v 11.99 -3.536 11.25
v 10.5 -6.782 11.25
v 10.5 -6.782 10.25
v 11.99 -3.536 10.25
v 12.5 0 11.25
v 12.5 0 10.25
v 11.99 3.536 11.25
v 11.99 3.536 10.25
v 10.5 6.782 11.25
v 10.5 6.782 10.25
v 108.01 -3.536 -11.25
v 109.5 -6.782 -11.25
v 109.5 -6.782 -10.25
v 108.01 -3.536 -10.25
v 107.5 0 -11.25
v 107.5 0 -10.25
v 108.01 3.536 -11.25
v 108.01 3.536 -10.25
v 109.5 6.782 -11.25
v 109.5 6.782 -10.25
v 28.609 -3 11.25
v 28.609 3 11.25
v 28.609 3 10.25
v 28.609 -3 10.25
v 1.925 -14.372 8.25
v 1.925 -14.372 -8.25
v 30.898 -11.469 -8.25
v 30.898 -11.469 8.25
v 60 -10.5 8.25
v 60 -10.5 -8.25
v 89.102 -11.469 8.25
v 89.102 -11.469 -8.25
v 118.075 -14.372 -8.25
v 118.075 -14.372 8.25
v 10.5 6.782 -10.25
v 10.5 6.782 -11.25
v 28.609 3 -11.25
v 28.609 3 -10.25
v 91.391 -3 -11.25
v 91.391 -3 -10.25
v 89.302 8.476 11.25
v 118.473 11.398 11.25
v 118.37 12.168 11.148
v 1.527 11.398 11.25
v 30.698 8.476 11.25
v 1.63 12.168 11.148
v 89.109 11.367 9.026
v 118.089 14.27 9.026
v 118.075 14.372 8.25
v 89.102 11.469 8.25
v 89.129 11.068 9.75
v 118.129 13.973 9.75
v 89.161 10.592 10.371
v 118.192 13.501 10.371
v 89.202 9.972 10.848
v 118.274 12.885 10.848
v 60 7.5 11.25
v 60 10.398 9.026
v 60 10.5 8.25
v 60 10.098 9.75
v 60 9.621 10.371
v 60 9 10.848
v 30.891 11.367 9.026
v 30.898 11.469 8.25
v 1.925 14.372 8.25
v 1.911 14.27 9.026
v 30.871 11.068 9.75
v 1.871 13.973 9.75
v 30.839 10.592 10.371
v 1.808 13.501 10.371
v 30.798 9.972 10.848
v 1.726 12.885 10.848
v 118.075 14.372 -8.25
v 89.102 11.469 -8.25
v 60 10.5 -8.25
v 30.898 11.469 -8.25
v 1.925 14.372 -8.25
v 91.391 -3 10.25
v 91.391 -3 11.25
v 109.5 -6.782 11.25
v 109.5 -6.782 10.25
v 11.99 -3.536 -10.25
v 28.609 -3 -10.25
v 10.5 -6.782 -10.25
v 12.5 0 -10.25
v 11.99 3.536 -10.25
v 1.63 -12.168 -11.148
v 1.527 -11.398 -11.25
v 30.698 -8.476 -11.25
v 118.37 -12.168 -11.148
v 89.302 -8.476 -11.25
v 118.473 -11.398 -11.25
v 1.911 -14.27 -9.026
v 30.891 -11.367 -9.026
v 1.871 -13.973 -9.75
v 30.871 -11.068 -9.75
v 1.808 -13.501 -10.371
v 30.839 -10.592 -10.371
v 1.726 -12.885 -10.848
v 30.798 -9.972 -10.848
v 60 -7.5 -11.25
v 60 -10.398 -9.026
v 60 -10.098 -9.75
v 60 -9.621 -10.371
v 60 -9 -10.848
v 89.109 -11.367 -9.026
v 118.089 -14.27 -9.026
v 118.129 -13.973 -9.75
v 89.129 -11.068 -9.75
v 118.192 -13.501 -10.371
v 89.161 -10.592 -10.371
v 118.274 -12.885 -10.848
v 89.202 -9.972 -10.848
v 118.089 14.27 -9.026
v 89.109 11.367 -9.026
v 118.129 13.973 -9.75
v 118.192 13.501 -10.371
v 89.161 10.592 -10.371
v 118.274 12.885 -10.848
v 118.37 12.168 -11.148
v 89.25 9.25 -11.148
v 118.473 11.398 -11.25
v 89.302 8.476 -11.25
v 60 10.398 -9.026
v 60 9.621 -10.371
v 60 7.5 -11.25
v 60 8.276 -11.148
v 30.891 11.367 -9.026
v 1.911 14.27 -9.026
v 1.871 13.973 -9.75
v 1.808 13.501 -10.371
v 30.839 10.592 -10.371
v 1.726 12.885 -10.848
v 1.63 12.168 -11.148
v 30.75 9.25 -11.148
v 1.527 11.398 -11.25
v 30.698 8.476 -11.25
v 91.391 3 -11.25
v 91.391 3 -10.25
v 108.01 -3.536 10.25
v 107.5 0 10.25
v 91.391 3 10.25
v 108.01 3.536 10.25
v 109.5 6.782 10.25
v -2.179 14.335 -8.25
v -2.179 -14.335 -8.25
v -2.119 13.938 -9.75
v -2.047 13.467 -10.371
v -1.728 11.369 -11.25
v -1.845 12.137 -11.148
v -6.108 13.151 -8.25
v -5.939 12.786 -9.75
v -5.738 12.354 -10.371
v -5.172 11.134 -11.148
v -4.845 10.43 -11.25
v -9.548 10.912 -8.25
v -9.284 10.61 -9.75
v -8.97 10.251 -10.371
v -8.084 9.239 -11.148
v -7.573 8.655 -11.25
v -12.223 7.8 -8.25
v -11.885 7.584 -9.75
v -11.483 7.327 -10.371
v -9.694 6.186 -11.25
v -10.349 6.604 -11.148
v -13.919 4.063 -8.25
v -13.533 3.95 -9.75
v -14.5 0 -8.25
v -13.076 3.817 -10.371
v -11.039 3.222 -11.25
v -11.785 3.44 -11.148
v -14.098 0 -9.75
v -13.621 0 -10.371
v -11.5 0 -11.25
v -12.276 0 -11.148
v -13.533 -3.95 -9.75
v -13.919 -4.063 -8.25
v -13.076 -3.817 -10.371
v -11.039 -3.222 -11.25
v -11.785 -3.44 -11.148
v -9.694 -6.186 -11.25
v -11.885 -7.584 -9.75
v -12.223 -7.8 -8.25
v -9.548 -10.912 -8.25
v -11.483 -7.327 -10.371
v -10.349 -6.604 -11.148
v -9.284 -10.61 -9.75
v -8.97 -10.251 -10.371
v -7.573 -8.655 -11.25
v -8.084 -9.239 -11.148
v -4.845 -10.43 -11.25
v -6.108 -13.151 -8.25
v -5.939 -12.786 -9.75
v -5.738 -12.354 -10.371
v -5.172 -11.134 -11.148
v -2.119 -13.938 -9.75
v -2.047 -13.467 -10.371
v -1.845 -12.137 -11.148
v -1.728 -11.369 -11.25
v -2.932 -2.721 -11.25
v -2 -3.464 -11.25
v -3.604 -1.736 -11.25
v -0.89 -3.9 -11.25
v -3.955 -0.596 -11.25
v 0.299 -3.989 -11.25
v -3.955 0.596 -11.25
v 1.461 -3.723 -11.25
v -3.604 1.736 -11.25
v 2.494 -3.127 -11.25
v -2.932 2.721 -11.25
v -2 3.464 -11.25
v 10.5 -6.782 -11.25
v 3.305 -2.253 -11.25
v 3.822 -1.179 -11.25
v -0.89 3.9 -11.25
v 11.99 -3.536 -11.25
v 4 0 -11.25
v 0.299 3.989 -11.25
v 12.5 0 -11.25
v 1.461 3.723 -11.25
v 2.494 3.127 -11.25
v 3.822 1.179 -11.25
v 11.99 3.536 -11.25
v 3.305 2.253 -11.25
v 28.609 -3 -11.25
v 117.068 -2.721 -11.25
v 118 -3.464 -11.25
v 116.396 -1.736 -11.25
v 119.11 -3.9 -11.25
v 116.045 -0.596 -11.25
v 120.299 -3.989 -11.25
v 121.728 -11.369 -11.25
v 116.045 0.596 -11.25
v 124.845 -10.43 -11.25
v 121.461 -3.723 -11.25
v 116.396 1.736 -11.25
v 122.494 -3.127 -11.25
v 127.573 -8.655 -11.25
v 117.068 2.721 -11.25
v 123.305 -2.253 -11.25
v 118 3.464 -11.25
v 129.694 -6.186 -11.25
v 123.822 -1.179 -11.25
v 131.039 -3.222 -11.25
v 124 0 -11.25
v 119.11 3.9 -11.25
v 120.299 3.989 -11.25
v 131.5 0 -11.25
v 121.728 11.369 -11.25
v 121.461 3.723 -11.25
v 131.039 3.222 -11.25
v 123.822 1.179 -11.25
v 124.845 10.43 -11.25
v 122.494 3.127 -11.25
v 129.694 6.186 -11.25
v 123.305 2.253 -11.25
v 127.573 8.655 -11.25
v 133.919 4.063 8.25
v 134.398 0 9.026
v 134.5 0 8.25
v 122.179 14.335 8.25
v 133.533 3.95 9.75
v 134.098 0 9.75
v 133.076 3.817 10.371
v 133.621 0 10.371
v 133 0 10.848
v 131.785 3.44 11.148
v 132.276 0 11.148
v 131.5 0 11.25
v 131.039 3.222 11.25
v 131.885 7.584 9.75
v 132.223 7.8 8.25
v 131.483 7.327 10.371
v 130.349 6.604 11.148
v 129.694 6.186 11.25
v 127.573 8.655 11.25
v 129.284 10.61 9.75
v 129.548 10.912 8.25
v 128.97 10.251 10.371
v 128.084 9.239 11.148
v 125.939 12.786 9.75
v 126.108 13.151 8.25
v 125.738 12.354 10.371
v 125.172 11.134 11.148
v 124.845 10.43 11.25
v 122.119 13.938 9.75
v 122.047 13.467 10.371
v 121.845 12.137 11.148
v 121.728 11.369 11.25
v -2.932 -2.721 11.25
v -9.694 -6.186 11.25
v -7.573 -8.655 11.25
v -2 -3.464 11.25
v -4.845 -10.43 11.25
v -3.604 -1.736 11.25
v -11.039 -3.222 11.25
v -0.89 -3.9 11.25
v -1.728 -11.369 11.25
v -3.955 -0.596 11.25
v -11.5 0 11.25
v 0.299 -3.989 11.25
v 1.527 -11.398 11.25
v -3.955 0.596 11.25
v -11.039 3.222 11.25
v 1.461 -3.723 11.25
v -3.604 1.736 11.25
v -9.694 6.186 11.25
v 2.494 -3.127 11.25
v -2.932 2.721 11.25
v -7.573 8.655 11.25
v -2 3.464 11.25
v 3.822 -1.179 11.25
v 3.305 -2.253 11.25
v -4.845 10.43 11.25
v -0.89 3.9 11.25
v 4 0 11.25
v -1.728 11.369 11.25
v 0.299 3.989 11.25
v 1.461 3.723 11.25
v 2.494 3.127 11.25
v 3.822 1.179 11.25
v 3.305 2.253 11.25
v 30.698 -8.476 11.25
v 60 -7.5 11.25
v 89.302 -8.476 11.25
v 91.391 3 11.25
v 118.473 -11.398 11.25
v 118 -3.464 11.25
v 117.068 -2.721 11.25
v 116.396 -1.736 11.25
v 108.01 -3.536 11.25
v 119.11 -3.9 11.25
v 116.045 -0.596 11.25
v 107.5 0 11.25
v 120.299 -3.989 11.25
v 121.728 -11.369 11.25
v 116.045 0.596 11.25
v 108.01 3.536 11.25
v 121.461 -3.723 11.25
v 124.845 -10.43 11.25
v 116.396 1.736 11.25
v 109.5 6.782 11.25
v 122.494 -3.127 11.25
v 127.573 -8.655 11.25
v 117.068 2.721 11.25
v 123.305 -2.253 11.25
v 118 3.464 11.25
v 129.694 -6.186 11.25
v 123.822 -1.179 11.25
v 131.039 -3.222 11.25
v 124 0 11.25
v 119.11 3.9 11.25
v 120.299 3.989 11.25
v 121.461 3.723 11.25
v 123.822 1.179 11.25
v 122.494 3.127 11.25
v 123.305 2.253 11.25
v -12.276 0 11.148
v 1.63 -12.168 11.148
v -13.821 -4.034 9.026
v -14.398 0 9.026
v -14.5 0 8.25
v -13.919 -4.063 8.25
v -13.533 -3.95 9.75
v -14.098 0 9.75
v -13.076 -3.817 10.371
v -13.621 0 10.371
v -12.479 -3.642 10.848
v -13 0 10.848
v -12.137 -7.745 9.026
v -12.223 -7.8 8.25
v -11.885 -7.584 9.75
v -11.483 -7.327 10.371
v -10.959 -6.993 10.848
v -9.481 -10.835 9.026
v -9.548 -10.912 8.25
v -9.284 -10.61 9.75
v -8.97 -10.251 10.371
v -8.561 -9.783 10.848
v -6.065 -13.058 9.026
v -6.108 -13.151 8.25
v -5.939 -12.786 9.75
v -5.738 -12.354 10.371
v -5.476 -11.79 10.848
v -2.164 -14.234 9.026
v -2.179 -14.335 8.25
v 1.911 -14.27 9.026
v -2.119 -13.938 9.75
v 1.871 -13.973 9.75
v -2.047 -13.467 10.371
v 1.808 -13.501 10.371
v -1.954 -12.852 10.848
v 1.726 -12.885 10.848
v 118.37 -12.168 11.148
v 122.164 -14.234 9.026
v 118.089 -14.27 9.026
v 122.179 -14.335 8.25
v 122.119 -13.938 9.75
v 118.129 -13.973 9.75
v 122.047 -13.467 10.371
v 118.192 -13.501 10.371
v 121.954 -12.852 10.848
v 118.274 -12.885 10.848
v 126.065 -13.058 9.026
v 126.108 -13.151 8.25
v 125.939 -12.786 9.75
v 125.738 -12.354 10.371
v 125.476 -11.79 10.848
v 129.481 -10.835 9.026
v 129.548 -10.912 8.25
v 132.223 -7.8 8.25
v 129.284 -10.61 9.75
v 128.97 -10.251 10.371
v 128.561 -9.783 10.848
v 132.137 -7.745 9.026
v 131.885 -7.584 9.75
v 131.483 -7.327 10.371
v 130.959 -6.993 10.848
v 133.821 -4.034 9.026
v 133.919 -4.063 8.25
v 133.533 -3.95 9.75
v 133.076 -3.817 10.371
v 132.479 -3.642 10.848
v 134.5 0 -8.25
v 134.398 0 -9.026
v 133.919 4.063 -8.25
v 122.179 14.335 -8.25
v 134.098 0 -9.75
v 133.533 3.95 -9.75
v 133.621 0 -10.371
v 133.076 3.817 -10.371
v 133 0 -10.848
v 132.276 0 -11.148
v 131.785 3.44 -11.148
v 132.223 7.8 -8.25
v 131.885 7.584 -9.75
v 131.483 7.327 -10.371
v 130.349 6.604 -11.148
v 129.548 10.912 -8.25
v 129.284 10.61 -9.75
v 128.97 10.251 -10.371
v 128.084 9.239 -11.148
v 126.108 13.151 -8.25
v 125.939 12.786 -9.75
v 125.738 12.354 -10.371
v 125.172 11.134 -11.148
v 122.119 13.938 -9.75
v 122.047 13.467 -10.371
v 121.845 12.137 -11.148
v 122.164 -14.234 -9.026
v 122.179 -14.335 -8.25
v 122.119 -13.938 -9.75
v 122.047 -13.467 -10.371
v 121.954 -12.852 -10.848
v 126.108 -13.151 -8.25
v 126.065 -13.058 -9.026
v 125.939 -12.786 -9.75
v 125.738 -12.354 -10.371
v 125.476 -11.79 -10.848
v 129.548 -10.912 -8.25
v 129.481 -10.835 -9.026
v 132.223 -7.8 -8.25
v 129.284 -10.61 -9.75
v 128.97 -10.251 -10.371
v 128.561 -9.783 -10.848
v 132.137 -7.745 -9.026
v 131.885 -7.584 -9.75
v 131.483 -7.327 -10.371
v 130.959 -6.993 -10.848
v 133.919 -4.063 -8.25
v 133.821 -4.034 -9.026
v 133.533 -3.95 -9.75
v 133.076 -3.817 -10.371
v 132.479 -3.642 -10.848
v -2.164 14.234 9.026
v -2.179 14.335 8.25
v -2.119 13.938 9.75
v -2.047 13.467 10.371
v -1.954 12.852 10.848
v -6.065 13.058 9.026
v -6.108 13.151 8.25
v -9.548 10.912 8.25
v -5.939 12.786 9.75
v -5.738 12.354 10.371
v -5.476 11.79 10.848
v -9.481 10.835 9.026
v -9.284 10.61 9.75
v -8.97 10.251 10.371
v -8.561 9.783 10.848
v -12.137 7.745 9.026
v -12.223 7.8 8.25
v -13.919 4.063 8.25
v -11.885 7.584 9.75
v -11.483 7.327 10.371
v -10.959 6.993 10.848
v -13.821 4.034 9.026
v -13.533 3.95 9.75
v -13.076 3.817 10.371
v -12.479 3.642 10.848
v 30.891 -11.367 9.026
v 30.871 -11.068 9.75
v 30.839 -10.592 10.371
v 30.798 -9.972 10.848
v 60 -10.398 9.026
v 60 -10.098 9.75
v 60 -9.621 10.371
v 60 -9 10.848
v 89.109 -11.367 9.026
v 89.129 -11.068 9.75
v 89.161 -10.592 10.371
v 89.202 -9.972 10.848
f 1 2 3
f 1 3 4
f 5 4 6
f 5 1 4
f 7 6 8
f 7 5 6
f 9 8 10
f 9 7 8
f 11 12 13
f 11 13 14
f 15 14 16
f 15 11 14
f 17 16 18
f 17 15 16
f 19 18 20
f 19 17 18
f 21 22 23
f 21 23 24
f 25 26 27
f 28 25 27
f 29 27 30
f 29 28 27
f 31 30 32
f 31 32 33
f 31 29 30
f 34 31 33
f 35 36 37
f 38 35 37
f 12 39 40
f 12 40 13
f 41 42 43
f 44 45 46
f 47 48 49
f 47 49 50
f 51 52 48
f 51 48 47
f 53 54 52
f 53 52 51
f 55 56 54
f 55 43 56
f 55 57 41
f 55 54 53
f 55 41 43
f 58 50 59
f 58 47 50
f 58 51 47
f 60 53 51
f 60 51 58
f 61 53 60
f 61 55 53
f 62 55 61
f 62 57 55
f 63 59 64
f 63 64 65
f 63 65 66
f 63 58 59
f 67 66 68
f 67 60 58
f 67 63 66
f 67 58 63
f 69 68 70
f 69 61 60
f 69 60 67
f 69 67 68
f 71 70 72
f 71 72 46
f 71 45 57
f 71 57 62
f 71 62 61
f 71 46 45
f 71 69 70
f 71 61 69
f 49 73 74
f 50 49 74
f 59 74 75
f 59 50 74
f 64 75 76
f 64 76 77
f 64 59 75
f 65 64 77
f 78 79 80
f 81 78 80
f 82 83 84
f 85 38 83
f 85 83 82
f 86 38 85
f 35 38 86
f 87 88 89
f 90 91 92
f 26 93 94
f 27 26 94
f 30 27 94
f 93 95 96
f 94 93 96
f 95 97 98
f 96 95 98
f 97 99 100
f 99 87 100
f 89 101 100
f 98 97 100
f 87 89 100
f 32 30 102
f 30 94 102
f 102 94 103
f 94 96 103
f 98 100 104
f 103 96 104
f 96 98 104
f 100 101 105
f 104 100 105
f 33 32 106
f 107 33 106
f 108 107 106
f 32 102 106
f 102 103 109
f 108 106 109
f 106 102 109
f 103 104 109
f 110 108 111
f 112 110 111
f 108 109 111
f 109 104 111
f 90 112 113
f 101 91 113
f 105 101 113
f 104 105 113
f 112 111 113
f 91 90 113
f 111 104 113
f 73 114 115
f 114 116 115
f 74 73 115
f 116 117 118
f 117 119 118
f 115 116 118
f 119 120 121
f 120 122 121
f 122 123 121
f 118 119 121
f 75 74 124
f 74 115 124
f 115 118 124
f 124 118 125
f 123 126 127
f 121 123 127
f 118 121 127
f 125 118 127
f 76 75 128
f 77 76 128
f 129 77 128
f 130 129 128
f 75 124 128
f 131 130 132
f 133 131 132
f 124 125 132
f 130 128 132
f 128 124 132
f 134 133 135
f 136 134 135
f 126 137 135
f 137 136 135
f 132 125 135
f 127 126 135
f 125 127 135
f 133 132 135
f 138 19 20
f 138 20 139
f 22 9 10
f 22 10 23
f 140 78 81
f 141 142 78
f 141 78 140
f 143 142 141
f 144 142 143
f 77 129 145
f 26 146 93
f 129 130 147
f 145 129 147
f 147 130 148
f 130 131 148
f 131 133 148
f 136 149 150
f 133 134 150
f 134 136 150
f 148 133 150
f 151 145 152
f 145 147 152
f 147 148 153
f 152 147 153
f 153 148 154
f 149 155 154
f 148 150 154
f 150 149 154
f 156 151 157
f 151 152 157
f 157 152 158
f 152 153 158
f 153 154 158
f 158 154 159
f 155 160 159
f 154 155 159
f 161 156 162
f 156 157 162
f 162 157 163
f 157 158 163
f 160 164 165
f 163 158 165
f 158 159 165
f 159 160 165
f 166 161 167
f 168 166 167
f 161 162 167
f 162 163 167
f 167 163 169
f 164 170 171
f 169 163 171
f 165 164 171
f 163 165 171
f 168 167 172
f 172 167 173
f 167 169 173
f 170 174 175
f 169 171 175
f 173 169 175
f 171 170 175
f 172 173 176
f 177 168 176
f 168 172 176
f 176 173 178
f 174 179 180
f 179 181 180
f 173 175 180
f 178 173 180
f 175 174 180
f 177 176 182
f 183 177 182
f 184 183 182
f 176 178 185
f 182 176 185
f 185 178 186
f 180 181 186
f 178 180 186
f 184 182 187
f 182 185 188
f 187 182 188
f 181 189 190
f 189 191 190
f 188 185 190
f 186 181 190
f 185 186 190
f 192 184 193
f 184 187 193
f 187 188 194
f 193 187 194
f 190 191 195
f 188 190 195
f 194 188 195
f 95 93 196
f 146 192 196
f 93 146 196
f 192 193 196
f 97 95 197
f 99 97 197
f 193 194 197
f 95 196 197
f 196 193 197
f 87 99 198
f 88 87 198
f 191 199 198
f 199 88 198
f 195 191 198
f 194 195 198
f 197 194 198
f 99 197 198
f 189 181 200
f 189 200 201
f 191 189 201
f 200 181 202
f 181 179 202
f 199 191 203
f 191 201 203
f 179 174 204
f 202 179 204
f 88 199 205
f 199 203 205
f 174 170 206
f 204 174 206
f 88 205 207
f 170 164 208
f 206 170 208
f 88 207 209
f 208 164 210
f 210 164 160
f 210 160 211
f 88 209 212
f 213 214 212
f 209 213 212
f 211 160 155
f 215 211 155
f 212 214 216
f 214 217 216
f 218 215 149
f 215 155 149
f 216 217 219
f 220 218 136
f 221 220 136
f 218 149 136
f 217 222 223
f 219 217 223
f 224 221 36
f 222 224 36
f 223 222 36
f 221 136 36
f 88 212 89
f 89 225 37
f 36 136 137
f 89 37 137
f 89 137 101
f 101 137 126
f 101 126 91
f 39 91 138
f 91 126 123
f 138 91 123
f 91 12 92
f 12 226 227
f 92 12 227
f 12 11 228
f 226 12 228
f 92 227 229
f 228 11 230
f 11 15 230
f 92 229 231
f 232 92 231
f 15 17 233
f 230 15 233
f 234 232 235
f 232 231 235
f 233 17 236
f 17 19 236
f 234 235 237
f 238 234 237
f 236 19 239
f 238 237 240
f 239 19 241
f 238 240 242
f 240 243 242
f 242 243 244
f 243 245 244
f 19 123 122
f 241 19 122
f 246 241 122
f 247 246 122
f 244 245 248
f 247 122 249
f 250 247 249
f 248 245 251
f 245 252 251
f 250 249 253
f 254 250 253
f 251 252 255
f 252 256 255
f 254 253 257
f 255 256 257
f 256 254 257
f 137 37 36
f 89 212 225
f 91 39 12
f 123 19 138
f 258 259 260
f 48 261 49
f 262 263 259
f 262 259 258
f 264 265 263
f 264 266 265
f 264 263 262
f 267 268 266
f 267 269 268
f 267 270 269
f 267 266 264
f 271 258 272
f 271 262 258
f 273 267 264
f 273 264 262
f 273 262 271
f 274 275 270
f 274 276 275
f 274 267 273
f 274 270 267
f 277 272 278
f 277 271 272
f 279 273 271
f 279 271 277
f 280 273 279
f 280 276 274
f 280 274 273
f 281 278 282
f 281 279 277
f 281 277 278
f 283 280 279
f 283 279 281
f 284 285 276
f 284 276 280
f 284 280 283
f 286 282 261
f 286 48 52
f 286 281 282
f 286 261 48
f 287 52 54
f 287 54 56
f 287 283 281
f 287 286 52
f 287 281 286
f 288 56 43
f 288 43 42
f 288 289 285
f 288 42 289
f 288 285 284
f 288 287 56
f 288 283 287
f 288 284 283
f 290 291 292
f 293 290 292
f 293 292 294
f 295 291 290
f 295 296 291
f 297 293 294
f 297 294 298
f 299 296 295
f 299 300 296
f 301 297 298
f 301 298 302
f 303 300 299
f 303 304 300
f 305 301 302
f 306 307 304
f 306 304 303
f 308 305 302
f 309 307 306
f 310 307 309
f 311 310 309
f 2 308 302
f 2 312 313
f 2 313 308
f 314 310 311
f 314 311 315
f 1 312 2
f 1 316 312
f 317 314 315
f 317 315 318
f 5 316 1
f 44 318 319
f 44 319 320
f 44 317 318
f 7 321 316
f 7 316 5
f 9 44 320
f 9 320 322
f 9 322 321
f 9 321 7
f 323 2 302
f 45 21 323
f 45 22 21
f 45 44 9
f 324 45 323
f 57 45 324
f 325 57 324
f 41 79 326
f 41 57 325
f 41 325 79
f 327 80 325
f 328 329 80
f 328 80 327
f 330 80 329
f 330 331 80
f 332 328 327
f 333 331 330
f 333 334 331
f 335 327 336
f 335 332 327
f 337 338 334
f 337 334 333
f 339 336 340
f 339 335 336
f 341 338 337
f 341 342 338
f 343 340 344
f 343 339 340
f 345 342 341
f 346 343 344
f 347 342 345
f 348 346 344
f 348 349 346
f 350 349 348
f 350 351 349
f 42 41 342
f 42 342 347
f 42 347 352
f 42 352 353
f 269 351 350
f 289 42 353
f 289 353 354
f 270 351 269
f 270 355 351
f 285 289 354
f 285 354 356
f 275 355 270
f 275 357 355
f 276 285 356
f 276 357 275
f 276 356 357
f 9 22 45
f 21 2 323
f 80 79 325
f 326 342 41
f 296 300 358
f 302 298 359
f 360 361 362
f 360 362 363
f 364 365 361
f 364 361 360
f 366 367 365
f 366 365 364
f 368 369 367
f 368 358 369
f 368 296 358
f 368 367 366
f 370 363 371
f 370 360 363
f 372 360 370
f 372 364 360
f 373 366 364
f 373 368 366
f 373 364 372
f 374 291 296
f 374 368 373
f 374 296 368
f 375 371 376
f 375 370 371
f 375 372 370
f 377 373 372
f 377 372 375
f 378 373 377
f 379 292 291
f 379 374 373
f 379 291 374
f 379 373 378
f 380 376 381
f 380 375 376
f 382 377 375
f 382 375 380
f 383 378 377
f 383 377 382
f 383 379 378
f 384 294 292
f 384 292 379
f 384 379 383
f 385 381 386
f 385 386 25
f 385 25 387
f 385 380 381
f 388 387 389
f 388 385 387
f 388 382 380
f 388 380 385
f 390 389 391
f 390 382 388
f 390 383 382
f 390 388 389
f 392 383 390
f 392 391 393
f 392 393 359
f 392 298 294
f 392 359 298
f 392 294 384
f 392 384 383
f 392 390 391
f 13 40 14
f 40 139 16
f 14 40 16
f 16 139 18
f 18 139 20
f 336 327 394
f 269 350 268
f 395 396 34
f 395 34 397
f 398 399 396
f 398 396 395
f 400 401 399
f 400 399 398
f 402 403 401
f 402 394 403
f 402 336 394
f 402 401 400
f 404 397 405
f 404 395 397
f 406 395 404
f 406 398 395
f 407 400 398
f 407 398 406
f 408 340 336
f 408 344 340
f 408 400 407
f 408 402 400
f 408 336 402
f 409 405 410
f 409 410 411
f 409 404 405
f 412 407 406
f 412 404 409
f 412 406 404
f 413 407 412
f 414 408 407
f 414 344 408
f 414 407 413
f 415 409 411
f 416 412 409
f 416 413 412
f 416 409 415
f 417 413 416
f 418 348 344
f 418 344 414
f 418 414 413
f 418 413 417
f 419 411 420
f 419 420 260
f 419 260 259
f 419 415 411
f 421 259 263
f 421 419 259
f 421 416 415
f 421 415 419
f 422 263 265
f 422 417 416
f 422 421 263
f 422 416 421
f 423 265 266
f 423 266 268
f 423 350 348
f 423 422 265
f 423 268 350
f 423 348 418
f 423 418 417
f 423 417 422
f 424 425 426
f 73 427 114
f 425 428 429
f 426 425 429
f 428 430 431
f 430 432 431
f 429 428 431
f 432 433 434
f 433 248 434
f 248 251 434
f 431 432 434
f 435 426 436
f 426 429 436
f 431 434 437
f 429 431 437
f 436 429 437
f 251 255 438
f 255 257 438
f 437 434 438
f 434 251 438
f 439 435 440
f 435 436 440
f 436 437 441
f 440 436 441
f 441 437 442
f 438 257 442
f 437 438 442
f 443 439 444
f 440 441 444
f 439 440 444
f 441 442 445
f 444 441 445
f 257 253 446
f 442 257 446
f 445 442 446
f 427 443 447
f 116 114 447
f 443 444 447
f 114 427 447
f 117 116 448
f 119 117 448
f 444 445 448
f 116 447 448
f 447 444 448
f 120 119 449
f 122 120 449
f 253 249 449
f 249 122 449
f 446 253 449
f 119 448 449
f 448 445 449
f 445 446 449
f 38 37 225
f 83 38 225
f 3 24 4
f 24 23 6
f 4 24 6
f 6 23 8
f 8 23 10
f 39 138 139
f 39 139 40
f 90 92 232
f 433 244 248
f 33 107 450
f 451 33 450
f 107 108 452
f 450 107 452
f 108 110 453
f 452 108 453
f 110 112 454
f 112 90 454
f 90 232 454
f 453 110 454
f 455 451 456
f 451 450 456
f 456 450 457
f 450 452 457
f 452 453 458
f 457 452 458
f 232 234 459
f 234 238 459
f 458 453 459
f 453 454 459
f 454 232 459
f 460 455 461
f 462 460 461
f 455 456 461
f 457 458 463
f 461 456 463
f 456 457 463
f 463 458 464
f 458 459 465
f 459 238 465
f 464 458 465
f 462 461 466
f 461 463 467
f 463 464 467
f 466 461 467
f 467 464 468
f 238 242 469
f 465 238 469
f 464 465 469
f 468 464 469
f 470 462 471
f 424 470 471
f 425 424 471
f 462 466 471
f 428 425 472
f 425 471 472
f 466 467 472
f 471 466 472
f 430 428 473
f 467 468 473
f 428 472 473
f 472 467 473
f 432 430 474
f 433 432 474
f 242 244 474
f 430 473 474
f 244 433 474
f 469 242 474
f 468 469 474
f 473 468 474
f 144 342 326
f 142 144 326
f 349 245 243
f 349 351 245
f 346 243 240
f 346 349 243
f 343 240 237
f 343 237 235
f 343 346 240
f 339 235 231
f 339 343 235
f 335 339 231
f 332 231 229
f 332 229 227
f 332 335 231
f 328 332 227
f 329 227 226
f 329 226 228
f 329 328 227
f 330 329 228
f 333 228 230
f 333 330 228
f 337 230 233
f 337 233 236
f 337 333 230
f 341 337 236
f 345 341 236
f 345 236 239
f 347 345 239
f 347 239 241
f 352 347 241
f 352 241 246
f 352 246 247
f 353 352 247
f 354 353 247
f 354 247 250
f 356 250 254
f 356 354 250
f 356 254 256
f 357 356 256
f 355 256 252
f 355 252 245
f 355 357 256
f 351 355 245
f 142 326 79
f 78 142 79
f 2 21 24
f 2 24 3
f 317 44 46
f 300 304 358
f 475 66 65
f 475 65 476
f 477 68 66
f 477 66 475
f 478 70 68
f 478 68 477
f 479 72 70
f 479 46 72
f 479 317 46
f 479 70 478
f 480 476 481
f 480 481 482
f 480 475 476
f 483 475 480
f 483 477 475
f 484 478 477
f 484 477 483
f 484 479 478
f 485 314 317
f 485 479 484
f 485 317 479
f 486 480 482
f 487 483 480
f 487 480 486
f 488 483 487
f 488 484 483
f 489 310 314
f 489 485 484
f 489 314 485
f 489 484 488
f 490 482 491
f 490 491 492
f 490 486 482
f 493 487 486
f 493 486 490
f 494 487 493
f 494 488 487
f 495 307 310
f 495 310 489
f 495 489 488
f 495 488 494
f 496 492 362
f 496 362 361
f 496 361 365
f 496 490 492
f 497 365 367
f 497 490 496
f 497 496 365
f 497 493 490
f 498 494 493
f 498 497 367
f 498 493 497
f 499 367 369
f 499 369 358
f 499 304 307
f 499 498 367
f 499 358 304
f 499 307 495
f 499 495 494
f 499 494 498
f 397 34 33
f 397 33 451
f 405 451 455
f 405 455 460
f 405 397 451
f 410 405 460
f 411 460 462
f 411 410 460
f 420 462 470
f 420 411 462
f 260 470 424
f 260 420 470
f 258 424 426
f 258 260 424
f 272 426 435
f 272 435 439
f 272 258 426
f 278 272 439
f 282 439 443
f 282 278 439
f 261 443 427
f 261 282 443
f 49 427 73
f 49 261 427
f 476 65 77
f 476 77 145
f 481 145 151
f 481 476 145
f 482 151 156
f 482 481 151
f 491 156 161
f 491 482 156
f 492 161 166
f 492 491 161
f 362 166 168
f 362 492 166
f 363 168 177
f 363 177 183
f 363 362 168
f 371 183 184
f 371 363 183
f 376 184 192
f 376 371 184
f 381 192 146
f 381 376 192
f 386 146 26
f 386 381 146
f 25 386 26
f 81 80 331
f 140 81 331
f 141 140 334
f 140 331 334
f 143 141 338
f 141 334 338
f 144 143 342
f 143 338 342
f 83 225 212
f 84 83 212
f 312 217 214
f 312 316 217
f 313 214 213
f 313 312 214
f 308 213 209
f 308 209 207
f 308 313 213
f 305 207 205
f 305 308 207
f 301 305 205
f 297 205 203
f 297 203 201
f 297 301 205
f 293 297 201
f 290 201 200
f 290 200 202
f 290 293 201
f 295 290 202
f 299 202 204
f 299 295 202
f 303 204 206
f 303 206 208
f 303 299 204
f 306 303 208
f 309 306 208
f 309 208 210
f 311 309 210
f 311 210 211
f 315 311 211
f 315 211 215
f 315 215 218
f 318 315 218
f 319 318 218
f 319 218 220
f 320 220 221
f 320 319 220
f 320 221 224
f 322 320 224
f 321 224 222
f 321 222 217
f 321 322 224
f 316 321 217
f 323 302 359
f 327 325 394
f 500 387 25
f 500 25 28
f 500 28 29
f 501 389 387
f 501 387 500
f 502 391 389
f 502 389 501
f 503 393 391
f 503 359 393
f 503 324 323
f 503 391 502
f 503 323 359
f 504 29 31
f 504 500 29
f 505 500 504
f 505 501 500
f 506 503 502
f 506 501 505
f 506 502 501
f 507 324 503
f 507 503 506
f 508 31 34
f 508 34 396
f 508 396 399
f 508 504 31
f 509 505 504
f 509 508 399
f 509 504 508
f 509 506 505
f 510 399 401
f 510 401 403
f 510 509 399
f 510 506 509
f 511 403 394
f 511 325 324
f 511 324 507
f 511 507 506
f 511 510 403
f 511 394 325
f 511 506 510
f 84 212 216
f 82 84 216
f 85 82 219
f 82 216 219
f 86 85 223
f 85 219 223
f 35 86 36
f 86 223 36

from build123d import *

# Parameters (mm, degrees)
ESQUISSE1_R             = 4
BOSS_EXTRU_1_DEPTH      = 11.25
CONG_1_R                = 3
CONG_1_OF_SYM_TRIE5_R   = 3
ENL_V_MAT_EXTRU_1_DEPTH = 1


with BuildPart() as part:
    # Esquisse1 → Boss.-Extru.1 (new body)
    with BuildSketch(Plane.XY):
        with BuildLine():
            ThreePointArc((1.924778761, 14.371681416), (-14.5, 0), (1.924778761, -14.371681416))
            ThreePointArc((1.924778761, -14.371681416), (60, -10.5), (118.075221239, -14.371681416))
            ThreePointArc((118.075221239, -14.371681416), (134.5, 0), (118.075221239, 14.371681416))
            ThreePointArc((118.075221239, 14.371681416), (60, 10.5), (1.924778761, 14.371681416))
        make_face()
        with Locations((120, 0)):
            Circle(ESQUISSE1_R, mode=Mode.SUBTRACT)
        Circle(ESQUISSE1_R, mode=Mode.SUBTRACT)
    boss_extru_1 = extrude(amount=BOSS_EXTRU_1_DEPTH)

    # Congé1
    cong_1_edges = [part.edges().sort_by_distance(p)[0] for p in [
        (60, 10.5, 11.25),
        (134.5, 0, 11.25),
        (60, -10.5, 11.25),
        (-14.5, 0, 11.25),
    ]]
    fillet(cong_1_edges, radius=CONG_1_R)

    # Symétrie5: Boss.-Extru.1 across plane
    add(boss_extru_1.mirror(Plane.XY))

    # Congé1 of Symétrie5
    cong_1_of_sym_trie5_edges = [part.edges().sort_by_distance(p)[0] for p in [
        (60, 10.5, -11.25),
        (134.5, 0, -11.25),
        (60, -10.5, -11.25),
        (-14.5, 0, -11.25),
    ]]
    fillet(cong_1_of_sym_trie5_edges, radius=CONG_1_OF_SYM_TRIE5_R)

    # Esquisse3 → Enlèv. mat.-Extru.1 (cut)
    with BuildSketch(Plane.XY.offset(11.25)):
        with BuildLine():
            Line((10.5, 6.782329983), (28.609223614, 3))
            Line((28.609223614, 3), (28.609223614, -3))
            Line((28.609223614, -3), (10.5, -6.782329983))
            ThreePointArc((10.5, -6.782329983), (12.5, 0), (10.5, 6.782329983))
        make_face()
        with BuildLine():
            Line((91.390776386, -3), (109.5, -6.782329983))
            ThreePointArc((109.5, -6.782329983), (107.5, 0), (109.5, 6.782329983))
            Line((109.5, 6.782329983), (91.390776386, 3))
            Line((91.390776386, 3), (91.390776386, -3))
        make_face()
    enl_v_mat_extru_1 = extrude(amount=-ENL_V_MAT_EXTRU_1_DEPTH, mode=Mode.SUBTRACT)

    # Symétrie6: Enlèv. mat.-Extru.1 across plane
    add(enl_v_mat_extru_1.mirror(Plane.XY), mode=Mode.SUBTRACT)


solid = part.part
